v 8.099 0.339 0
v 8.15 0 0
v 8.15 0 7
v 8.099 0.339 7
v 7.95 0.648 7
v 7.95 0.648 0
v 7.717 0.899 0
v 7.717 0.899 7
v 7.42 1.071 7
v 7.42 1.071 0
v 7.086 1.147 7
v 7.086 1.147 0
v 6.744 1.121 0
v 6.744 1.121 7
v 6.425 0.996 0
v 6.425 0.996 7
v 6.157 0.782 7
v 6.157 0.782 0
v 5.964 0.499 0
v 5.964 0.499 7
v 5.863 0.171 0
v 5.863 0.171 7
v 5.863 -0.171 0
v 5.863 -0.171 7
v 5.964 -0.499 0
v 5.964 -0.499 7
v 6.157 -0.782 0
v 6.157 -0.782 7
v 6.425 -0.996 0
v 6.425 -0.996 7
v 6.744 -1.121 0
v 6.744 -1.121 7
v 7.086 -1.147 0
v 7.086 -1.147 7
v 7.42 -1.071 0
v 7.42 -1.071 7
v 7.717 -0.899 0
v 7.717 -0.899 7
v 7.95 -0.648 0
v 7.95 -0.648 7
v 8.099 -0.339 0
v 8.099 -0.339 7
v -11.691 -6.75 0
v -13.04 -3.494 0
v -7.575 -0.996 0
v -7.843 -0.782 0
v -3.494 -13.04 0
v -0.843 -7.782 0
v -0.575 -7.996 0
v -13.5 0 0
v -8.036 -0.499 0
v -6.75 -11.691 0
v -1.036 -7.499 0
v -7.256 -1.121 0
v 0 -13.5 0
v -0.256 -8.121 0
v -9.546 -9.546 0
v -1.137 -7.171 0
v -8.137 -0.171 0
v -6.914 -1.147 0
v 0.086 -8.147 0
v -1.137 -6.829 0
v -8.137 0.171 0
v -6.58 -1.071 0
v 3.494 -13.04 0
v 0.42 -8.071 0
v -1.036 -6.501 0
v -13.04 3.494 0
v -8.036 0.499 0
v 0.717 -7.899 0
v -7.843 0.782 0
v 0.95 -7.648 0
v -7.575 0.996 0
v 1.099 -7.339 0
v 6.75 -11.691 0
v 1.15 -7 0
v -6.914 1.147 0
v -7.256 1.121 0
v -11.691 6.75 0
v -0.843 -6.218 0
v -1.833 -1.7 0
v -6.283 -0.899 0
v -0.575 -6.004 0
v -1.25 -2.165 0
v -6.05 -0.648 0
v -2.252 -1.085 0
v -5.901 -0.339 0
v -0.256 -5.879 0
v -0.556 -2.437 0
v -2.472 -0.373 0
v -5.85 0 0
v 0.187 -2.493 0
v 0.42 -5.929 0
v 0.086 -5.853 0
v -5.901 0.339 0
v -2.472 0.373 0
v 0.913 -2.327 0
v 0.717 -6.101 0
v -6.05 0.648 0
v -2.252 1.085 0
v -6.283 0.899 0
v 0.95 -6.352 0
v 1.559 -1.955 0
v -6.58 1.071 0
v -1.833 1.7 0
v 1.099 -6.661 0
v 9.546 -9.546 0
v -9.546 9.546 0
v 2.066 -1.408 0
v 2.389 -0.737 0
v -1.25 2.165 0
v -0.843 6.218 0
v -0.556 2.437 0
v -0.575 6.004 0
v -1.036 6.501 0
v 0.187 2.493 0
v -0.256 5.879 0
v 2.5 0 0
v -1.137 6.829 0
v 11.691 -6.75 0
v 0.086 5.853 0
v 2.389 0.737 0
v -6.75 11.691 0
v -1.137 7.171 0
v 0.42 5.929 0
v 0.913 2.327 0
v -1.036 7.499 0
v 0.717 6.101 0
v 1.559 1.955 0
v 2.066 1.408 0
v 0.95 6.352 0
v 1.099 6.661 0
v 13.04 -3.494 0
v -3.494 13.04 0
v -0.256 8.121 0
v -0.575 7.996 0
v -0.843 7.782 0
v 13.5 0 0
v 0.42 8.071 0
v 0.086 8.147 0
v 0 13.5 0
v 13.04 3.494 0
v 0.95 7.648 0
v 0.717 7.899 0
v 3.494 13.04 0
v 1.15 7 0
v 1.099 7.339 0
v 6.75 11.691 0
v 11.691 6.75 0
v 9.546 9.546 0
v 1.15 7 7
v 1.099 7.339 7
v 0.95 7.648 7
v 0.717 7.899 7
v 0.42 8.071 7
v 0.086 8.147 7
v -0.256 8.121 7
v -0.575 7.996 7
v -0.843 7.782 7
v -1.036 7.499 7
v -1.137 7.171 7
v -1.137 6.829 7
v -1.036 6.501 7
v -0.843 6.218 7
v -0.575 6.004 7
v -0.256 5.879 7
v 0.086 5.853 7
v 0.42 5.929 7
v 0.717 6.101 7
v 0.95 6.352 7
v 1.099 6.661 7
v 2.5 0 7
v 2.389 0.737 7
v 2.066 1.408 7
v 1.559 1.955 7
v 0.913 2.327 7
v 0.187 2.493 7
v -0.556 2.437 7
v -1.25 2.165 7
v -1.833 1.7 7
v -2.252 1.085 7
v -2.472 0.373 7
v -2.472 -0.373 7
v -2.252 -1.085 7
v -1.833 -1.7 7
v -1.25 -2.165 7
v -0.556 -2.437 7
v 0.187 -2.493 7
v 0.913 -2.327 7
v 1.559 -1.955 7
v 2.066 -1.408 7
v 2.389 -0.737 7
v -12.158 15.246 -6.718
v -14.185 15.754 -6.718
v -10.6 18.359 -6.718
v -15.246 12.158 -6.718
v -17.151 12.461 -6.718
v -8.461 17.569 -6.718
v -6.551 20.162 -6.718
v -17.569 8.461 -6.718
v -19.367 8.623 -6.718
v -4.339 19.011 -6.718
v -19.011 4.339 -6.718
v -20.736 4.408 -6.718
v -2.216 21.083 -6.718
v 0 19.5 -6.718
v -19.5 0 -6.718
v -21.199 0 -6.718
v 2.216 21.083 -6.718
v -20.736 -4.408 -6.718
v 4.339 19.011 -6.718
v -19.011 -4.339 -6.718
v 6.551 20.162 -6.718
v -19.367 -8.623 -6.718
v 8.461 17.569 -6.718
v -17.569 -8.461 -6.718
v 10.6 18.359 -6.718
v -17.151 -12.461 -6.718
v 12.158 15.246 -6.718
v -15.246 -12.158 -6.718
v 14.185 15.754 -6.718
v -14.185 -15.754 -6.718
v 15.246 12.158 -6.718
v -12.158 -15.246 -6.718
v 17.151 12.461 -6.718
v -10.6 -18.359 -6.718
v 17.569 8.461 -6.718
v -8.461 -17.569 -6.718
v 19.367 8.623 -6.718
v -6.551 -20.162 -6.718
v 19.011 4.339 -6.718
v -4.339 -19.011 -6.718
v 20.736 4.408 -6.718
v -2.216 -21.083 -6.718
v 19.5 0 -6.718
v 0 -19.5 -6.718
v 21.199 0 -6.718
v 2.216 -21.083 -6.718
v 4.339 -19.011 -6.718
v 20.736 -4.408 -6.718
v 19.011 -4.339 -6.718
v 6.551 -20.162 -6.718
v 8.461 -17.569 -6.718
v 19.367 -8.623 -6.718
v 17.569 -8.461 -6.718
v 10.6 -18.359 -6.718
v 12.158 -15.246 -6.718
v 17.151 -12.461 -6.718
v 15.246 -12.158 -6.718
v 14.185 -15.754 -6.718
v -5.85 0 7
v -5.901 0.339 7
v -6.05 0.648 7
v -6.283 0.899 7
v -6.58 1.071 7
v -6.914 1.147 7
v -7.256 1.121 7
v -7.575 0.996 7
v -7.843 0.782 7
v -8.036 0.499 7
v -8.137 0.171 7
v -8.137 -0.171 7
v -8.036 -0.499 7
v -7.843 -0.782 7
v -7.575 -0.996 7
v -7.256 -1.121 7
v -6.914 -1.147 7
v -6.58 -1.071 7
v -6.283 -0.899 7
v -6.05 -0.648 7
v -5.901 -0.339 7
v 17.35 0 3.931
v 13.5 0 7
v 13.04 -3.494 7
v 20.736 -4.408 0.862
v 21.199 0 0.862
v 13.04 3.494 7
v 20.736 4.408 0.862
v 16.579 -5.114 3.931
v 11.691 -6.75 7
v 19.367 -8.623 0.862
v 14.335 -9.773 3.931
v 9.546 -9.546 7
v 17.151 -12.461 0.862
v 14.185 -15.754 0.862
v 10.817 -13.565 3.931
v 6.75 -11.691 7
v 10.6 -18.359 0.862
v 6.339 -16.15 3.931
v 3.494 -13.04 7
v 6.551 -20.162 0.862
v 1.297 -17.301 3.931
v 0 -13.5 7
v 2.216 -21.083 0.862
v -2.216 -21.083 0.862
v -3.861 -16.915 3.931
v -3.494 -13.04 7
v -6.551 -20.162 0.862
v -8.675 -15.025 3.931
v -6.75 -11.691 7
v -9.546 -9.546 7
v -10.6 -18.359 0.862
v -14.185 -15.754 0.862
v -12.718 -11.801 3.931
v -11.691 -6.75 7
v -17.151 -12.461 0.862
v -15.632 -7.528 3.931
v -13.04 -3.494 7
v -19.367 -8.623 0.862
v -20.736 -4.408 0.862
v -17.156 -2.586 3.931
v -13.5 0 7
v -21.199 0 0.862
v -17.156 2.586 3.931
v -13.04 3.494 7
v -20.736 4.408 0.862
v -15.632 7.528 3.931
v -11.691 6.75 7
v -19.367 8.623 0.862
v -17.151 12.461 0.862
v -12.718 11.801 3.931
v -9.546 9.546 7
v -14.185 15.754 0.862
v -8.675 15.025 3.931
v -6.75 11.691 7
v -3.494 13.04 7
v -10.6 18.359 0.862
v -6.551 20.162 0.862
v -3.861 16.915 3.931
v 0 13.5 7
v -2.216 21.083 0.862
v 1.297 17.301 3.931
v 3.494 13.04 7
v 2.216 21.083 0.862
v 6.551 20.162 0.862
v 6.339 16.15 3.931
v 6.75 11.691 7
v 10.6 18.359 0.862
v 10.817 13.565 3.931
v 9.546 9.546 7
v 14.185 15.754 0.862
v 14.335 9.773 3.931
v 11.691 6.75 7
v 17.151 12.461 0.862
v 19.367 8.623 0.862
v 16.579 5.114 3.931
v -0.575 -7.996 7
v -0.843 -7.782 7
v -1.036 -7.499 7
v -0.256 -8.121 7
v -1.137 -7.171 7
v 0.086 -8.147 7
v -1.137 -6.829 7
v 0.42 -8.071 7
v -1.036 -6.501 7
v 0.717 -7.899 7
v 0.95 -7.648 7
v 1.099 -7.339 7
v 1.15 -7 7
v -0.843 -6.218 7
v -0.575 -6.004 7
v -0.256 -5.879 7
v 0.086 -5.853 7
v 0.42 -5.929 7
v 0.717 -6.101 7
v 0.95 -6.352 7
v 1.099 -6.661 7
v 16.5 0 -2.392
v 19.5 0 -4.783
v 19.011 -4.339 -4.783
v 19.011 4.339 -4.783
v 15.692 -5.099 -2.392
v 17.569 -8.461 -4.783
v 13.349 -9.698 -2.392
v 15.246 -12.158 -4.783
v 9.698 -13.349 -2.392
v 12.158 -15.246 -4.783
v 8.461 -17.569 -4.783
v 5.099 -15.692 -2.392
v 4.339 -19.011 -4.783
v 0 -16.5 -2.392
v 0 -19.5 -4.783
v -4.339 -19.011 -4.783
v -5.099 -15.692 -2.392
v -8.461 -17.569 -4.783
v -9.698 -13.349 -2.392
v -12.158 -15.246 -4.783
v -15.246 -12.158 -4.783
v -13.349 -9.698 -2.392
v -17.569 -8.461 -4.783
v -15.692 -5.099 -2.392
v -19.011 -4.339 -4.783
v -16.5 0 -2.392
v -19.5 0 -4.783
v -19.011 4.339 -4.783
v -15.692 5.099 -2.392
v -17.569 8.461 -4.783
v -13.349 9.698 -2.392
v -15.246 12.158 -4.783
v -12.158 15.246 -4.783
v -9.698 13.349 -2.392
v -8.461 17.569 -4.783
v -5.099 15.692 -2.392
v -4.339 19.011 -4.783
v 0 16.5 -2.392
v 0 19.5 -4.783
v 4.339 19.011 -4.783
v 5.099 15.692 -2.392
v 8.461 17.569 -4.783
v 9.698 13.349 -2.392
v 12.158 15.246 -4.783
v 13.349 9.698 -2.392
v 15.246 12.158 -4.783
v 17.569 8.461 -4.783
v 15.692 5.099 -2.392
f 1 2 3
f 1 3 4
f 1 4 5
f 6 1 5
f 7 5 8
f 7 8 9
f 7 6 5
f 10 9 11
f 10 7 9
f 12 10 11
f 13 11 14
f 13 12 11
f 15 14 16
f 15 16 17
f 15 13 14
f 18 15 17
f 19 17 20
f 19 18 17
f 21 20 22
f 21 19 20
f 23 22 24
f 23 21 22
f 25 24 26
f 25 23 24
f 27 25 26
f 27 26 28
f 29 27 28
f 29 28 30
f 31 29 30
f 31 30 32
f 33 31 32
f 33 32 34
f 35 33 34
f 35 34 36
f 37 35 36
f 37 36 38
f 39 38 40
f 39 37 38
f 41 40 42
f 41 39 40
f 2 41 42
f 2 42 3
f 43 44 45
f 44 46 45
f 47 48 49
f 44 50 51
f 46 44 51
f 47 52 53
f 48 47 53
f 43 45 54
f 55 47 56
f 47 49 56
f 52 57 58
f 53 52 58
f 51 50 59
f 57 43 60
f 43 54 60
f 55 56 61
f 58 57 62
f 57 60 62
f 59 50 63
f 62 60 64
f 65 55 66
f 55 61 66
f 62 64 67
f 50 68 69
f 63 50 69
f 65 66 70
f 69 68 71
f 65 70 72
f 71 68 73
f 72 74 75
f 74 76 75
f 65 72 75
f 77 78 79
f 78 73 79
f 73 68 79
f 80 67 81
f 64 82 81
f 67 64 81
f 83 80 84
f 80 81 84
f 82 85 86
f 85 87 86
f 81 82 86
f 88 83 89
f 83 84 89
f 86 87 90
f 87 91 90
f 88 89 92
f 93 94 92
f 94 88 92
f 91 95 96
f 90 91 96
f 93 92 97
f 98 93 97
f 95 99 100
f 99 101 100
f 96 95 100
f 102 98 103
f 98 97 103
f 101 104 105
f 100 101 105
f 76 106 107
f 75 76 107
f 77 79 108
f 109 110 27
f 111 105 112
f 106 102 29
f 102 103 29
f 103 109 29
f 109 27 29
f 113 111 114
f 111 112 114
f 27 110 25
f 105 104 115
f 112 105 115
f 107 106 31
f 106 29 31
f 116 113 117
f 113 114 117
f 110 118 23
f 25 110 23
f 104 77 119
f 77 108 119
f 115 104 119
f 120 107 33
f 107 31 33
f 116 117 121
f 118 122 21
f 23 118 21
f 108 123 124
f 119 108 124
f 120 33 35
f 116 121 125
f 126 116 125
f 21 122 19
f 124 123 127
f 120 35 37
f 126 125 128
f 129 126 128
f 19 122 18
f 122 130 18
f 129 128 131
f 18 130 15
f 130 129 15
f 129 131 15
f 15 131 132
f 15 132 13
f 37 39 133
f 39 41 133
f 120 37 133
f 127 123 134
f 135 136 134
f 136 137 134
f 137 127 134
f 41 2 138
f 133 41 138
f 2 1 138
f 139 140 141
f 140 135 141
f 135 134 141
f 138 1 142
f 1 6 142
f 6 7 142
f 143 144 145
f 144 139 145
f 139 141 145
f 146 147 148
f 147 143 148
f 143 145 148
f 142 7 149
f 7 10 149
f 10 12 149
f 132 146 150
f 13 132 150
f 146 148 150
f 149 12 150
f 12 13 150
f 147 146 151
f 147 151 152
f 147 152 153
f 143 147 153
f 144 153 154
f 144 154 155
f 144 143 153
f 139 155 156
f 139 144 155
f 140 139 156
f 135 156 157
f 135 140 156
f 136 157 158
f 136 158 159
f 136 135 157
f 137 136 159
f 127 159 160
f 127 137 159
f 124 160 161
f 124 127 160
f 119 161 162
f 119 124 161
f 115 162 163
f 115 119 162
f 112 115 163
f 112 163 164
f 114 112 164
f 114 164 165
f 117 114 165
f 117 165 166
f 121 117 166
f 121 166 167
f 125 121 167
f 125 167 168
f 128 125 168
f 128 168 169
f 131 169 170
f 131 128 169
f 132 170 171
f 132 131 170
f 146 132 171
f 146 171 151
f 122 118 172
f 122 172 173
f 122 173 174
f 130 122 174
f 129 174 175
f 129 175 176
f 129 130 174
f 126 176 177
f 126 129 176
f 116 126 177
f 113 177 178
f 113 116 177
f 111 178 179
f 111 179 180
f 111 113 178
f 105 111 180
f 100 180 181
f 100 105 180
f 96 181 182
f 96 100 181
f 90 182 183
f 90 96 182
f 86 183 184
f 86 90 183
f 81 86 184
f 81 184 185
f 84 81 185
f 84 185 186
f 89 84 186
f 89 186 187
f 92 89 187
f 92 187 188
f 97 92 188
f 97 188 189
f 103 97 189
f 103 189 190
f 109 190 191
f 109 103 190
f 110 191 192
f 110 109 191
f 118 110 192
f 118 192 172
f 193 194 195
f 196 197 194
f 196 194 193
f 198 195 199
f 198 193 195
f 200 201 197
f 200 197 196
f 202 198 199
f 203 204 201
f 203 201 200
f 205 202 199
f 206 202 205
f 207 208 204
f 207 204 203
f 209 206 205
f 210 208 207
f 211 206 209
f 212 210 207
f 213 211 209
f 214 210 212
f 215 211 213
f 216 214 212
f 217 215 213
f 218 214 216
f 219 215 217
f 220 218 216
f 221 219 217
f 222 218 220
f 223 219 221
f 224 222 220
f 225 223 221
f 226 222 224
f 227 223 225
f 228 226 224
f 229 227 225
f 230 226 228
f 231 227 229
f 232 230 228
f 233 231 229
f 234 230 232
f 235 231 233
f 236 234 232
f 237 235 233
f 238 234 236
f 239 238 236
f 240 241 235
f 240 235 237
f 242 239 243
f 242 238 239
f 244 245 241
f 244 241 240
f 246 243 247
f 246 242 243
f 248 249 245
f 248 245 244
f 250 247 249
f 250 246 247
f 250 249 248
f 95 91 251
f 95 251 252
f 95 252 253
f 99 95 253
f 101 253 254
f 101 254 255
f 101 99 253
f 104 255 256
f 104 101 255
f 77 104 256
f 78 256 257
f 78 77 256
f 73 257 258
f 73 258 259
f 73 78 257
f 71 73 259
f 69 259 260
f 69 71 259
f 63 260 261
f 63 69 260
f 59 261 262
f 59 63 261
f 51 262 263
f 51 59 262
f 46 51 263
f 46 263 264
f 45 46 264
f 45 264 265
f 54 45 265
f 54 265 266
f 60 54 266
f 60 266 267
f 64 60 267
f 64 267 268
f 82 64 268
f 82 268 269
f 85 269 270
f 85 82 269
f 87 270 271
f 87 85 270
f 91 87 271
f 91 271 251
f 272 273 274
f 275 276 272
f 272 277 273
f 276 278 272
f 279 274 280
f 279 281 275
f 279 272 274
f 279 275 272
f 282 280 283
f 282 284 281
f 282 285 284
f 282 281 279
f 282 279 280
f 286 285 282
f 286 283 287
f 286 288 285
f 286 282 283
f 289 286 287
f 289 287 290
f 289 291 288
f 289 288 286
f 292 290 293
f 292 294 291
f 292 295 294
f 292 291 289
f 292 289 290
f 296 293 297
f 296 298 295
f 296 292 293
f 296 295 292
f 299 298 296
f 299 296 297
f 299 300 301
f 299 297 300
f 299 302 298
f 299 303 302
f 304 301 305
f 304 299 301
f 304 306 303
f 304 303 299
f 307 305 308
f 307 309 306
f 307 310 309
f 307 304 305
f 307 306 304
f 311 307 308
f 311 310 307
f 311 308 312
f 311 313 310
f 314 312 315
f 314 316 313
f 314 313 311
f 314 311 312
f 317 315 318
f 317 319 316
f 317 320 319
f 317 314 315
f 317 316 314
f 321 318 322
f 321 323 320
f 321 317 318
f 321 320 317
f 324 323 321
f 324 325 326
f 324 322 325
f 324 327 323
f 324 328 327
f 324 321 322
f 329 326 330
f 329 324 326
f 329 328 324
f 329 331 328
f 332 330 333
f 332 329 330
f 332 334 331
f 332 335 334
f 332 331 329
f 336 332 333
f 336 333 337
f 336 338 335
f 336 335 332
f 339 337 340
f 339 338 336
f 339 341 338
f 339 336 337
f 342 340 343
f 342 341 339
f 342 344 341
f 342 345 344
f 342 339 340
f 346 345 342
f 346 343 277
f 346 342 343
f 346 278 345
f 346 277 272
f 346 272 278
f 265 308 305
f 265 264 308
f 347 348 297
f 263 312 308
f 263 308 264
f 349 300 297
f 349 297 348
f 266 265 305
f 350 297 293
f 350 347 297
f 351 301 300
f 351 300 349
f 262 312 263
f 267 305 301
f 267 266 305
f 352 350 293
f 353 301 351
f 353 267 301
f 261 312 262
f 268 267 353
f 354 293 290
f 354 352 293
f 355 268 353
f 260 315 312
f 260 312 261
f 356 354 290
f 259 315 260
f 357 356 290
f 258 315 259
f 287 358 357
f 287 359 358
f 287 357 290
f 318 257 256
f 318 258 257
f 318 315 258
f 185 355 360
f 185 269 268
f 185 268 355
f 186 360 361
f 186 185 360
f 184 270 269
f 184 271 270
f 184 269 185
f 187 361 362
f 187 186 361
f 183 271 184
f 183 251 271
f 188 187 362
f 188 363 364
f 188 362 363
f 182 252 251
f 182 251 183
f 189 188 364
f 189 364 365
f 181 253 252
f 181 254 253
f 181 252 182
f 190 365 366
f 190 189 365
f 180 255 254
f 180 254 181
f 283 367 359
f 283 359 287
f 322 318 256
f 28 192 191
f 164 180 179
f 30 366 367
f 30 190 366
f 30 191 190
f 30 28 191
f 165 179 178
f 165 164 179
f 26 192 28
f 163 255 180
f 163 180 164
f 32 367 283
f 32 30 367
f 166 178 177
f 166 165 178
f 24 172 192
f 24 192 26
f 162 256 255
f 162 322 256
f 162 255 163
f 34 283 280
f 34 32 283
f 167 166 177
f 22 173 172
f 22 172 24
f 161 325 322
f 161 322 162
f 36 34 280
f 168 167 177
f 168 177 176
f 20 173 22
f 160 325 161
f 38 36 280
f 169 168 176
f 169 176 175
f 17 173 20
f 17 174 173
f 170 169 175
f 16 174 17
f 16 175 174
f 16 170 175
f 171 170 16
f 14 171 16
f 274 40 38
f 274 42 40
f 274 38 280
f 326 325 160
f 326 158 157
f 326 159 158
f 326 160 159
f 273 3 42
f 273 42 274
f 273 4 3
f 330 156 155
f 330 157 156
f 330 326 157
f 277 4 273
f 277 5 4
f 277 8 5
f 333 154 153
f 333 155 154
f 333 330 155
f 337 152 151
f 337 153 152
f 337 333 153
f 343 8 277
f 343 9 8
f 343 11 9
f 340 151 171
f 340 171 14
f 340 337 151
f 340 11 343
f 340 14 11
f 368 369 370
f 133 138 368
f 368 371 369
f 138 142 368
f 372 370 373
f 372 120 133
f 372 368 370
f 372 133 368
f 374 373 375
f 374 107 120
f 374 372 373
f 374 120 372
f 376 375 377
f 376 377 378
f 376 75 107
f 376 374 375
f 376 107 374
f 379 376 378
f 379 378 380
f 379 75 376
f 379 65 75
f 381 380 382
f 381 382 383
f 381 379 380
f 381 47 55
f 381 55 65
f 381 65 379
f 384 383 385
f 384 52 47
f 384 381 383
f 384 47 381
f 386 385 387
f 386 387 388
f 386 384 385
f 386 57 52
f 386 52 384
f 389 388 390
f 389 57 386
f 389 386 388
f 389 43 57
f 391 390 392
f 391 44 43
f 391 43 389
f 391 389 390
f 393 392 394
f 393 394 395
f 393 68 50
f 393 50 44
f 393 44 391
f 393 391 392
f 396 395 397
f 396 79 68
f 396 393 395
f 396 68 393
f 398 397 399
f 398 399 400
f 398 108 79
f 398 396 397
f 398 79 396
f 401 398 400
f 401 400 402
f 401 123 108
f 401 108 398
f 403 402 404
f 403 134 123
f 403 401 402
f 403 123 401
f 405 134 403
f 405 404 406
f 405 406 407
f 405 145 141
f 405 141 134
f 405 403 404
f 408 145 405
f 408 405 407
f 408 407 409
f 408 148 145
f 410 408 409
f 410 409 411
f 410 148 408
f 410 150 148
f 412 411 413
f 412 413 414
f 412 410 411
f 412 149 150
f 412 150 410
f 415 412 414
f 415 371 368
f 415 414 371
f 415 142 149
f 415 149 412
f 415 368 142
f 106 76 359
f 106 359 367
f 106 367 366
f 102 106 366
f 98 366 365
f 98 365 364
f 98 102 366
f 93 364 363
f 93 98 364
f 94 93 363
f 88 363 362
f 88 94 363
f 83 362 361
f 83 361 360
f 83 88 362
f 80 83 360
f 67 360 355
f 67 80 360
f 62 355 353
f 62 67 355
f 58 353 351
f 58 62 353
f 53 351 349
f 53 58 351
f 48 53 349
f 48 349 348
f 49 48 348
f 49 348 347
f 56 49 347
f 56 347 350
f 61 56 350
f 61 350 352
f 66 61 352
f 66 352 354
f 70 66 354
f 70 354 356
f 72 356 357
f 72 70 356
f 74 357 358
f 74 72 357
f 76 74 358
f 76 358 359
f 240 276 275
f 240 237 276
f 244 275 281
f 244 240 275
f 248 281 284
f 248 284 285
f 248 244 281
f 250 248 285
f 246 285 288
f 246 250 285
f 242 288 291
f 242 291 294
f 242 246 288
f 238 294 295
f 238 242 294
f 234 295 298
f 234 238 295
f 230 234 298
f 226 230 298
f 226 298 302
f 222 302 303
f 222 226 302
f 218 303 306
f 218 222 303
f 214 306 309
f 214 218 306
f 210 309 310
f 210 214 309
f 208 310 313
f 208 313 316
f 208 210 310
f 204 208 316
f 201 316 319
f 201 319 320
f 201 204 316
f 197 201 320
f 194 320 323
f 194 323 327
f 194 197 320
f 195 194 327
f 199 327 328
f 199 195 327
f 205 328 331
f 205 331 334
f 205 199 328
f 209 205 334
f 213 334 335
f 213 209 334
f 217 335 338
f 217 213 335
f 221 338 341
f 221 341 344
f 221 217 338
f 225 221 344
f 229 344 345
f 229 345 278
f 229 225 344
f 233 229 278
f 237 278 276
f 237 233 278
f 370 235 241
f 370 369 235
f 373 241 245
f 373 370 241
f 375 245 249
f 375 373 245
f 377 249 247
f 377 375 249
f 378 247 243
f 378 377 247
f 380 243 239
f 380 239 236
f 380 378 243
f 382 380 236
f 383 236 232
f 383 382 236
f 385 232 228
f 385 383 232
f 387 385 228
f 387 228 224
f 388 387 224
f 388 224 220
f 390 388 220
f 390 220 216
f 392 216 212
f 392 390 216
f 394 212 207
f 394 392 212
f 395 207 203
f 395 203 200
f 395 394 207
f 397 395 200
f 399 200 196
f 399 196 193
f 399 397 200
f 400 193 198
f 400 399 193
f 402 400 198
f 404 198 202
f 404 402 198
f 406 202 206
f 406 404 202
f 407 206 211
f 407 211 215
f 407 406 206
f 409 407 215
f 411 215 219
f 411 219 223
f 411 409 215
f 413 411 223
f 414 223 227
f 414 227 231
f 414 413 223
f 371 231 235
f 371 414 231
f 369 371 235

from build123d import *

# Parameters (mm, degrees)
SKETCH_1_R      = 13.5
SKETCH_1_R_2    = 1.15
SKETCH_1_R_3    = 2.5
EXTRUDE_1_DEPTH = 7


with BuildPart() as part:
    # 草图1 → 凸台-拉伸1 (new body)
    with BuildSketch(Plane.XY):
        Circle(SKETCH_1_R)
        with Locations((0, 7)):
            Circle(SKETCH_1_R_2, mode=Mode.SUBTRACT)
        with Locations((0, -7)):
            Circle(SKETCH_1_R_2, mode=Mode.SUBTRACT)
        with Locations((7, 0)):
            Circle(SKETCH_1_R_2, mode=Mode.SUBTRACT)
        with Locations((-7, 0)):
            Circle(SKETCH_1_R_2, mode=Mode.SUBTRACT)
        Circle(SKETCH_1_R_3, mode=Mode.SUBTRACT)
    extrude(amount=EXTRUDE_1_DEPTH)

    # 草图2 → 旋转1 (revolve)
    with BuildSketch(Plane(origin=(0, 0, 0), x_dir=(0, 0, -1), z_dir=(1, 0, 0)), mode=Mode.PRIVATE) as revolve_1_sk:
        Polygon((-7, 13.5), (-0.861872247, 21.199331537), (6.717890827, 21.199331537), (6.717890827, 19.5), (4.783371951, 19.5), (0, 13.5), align=None)
    revolve(revolve_1_sk.sketch.rotate(Axis((0, 0, 0), (0, 0, -1)), 90), axis=Axis((0, 0, 0), (0, 0, -1)))


solid = part.part
